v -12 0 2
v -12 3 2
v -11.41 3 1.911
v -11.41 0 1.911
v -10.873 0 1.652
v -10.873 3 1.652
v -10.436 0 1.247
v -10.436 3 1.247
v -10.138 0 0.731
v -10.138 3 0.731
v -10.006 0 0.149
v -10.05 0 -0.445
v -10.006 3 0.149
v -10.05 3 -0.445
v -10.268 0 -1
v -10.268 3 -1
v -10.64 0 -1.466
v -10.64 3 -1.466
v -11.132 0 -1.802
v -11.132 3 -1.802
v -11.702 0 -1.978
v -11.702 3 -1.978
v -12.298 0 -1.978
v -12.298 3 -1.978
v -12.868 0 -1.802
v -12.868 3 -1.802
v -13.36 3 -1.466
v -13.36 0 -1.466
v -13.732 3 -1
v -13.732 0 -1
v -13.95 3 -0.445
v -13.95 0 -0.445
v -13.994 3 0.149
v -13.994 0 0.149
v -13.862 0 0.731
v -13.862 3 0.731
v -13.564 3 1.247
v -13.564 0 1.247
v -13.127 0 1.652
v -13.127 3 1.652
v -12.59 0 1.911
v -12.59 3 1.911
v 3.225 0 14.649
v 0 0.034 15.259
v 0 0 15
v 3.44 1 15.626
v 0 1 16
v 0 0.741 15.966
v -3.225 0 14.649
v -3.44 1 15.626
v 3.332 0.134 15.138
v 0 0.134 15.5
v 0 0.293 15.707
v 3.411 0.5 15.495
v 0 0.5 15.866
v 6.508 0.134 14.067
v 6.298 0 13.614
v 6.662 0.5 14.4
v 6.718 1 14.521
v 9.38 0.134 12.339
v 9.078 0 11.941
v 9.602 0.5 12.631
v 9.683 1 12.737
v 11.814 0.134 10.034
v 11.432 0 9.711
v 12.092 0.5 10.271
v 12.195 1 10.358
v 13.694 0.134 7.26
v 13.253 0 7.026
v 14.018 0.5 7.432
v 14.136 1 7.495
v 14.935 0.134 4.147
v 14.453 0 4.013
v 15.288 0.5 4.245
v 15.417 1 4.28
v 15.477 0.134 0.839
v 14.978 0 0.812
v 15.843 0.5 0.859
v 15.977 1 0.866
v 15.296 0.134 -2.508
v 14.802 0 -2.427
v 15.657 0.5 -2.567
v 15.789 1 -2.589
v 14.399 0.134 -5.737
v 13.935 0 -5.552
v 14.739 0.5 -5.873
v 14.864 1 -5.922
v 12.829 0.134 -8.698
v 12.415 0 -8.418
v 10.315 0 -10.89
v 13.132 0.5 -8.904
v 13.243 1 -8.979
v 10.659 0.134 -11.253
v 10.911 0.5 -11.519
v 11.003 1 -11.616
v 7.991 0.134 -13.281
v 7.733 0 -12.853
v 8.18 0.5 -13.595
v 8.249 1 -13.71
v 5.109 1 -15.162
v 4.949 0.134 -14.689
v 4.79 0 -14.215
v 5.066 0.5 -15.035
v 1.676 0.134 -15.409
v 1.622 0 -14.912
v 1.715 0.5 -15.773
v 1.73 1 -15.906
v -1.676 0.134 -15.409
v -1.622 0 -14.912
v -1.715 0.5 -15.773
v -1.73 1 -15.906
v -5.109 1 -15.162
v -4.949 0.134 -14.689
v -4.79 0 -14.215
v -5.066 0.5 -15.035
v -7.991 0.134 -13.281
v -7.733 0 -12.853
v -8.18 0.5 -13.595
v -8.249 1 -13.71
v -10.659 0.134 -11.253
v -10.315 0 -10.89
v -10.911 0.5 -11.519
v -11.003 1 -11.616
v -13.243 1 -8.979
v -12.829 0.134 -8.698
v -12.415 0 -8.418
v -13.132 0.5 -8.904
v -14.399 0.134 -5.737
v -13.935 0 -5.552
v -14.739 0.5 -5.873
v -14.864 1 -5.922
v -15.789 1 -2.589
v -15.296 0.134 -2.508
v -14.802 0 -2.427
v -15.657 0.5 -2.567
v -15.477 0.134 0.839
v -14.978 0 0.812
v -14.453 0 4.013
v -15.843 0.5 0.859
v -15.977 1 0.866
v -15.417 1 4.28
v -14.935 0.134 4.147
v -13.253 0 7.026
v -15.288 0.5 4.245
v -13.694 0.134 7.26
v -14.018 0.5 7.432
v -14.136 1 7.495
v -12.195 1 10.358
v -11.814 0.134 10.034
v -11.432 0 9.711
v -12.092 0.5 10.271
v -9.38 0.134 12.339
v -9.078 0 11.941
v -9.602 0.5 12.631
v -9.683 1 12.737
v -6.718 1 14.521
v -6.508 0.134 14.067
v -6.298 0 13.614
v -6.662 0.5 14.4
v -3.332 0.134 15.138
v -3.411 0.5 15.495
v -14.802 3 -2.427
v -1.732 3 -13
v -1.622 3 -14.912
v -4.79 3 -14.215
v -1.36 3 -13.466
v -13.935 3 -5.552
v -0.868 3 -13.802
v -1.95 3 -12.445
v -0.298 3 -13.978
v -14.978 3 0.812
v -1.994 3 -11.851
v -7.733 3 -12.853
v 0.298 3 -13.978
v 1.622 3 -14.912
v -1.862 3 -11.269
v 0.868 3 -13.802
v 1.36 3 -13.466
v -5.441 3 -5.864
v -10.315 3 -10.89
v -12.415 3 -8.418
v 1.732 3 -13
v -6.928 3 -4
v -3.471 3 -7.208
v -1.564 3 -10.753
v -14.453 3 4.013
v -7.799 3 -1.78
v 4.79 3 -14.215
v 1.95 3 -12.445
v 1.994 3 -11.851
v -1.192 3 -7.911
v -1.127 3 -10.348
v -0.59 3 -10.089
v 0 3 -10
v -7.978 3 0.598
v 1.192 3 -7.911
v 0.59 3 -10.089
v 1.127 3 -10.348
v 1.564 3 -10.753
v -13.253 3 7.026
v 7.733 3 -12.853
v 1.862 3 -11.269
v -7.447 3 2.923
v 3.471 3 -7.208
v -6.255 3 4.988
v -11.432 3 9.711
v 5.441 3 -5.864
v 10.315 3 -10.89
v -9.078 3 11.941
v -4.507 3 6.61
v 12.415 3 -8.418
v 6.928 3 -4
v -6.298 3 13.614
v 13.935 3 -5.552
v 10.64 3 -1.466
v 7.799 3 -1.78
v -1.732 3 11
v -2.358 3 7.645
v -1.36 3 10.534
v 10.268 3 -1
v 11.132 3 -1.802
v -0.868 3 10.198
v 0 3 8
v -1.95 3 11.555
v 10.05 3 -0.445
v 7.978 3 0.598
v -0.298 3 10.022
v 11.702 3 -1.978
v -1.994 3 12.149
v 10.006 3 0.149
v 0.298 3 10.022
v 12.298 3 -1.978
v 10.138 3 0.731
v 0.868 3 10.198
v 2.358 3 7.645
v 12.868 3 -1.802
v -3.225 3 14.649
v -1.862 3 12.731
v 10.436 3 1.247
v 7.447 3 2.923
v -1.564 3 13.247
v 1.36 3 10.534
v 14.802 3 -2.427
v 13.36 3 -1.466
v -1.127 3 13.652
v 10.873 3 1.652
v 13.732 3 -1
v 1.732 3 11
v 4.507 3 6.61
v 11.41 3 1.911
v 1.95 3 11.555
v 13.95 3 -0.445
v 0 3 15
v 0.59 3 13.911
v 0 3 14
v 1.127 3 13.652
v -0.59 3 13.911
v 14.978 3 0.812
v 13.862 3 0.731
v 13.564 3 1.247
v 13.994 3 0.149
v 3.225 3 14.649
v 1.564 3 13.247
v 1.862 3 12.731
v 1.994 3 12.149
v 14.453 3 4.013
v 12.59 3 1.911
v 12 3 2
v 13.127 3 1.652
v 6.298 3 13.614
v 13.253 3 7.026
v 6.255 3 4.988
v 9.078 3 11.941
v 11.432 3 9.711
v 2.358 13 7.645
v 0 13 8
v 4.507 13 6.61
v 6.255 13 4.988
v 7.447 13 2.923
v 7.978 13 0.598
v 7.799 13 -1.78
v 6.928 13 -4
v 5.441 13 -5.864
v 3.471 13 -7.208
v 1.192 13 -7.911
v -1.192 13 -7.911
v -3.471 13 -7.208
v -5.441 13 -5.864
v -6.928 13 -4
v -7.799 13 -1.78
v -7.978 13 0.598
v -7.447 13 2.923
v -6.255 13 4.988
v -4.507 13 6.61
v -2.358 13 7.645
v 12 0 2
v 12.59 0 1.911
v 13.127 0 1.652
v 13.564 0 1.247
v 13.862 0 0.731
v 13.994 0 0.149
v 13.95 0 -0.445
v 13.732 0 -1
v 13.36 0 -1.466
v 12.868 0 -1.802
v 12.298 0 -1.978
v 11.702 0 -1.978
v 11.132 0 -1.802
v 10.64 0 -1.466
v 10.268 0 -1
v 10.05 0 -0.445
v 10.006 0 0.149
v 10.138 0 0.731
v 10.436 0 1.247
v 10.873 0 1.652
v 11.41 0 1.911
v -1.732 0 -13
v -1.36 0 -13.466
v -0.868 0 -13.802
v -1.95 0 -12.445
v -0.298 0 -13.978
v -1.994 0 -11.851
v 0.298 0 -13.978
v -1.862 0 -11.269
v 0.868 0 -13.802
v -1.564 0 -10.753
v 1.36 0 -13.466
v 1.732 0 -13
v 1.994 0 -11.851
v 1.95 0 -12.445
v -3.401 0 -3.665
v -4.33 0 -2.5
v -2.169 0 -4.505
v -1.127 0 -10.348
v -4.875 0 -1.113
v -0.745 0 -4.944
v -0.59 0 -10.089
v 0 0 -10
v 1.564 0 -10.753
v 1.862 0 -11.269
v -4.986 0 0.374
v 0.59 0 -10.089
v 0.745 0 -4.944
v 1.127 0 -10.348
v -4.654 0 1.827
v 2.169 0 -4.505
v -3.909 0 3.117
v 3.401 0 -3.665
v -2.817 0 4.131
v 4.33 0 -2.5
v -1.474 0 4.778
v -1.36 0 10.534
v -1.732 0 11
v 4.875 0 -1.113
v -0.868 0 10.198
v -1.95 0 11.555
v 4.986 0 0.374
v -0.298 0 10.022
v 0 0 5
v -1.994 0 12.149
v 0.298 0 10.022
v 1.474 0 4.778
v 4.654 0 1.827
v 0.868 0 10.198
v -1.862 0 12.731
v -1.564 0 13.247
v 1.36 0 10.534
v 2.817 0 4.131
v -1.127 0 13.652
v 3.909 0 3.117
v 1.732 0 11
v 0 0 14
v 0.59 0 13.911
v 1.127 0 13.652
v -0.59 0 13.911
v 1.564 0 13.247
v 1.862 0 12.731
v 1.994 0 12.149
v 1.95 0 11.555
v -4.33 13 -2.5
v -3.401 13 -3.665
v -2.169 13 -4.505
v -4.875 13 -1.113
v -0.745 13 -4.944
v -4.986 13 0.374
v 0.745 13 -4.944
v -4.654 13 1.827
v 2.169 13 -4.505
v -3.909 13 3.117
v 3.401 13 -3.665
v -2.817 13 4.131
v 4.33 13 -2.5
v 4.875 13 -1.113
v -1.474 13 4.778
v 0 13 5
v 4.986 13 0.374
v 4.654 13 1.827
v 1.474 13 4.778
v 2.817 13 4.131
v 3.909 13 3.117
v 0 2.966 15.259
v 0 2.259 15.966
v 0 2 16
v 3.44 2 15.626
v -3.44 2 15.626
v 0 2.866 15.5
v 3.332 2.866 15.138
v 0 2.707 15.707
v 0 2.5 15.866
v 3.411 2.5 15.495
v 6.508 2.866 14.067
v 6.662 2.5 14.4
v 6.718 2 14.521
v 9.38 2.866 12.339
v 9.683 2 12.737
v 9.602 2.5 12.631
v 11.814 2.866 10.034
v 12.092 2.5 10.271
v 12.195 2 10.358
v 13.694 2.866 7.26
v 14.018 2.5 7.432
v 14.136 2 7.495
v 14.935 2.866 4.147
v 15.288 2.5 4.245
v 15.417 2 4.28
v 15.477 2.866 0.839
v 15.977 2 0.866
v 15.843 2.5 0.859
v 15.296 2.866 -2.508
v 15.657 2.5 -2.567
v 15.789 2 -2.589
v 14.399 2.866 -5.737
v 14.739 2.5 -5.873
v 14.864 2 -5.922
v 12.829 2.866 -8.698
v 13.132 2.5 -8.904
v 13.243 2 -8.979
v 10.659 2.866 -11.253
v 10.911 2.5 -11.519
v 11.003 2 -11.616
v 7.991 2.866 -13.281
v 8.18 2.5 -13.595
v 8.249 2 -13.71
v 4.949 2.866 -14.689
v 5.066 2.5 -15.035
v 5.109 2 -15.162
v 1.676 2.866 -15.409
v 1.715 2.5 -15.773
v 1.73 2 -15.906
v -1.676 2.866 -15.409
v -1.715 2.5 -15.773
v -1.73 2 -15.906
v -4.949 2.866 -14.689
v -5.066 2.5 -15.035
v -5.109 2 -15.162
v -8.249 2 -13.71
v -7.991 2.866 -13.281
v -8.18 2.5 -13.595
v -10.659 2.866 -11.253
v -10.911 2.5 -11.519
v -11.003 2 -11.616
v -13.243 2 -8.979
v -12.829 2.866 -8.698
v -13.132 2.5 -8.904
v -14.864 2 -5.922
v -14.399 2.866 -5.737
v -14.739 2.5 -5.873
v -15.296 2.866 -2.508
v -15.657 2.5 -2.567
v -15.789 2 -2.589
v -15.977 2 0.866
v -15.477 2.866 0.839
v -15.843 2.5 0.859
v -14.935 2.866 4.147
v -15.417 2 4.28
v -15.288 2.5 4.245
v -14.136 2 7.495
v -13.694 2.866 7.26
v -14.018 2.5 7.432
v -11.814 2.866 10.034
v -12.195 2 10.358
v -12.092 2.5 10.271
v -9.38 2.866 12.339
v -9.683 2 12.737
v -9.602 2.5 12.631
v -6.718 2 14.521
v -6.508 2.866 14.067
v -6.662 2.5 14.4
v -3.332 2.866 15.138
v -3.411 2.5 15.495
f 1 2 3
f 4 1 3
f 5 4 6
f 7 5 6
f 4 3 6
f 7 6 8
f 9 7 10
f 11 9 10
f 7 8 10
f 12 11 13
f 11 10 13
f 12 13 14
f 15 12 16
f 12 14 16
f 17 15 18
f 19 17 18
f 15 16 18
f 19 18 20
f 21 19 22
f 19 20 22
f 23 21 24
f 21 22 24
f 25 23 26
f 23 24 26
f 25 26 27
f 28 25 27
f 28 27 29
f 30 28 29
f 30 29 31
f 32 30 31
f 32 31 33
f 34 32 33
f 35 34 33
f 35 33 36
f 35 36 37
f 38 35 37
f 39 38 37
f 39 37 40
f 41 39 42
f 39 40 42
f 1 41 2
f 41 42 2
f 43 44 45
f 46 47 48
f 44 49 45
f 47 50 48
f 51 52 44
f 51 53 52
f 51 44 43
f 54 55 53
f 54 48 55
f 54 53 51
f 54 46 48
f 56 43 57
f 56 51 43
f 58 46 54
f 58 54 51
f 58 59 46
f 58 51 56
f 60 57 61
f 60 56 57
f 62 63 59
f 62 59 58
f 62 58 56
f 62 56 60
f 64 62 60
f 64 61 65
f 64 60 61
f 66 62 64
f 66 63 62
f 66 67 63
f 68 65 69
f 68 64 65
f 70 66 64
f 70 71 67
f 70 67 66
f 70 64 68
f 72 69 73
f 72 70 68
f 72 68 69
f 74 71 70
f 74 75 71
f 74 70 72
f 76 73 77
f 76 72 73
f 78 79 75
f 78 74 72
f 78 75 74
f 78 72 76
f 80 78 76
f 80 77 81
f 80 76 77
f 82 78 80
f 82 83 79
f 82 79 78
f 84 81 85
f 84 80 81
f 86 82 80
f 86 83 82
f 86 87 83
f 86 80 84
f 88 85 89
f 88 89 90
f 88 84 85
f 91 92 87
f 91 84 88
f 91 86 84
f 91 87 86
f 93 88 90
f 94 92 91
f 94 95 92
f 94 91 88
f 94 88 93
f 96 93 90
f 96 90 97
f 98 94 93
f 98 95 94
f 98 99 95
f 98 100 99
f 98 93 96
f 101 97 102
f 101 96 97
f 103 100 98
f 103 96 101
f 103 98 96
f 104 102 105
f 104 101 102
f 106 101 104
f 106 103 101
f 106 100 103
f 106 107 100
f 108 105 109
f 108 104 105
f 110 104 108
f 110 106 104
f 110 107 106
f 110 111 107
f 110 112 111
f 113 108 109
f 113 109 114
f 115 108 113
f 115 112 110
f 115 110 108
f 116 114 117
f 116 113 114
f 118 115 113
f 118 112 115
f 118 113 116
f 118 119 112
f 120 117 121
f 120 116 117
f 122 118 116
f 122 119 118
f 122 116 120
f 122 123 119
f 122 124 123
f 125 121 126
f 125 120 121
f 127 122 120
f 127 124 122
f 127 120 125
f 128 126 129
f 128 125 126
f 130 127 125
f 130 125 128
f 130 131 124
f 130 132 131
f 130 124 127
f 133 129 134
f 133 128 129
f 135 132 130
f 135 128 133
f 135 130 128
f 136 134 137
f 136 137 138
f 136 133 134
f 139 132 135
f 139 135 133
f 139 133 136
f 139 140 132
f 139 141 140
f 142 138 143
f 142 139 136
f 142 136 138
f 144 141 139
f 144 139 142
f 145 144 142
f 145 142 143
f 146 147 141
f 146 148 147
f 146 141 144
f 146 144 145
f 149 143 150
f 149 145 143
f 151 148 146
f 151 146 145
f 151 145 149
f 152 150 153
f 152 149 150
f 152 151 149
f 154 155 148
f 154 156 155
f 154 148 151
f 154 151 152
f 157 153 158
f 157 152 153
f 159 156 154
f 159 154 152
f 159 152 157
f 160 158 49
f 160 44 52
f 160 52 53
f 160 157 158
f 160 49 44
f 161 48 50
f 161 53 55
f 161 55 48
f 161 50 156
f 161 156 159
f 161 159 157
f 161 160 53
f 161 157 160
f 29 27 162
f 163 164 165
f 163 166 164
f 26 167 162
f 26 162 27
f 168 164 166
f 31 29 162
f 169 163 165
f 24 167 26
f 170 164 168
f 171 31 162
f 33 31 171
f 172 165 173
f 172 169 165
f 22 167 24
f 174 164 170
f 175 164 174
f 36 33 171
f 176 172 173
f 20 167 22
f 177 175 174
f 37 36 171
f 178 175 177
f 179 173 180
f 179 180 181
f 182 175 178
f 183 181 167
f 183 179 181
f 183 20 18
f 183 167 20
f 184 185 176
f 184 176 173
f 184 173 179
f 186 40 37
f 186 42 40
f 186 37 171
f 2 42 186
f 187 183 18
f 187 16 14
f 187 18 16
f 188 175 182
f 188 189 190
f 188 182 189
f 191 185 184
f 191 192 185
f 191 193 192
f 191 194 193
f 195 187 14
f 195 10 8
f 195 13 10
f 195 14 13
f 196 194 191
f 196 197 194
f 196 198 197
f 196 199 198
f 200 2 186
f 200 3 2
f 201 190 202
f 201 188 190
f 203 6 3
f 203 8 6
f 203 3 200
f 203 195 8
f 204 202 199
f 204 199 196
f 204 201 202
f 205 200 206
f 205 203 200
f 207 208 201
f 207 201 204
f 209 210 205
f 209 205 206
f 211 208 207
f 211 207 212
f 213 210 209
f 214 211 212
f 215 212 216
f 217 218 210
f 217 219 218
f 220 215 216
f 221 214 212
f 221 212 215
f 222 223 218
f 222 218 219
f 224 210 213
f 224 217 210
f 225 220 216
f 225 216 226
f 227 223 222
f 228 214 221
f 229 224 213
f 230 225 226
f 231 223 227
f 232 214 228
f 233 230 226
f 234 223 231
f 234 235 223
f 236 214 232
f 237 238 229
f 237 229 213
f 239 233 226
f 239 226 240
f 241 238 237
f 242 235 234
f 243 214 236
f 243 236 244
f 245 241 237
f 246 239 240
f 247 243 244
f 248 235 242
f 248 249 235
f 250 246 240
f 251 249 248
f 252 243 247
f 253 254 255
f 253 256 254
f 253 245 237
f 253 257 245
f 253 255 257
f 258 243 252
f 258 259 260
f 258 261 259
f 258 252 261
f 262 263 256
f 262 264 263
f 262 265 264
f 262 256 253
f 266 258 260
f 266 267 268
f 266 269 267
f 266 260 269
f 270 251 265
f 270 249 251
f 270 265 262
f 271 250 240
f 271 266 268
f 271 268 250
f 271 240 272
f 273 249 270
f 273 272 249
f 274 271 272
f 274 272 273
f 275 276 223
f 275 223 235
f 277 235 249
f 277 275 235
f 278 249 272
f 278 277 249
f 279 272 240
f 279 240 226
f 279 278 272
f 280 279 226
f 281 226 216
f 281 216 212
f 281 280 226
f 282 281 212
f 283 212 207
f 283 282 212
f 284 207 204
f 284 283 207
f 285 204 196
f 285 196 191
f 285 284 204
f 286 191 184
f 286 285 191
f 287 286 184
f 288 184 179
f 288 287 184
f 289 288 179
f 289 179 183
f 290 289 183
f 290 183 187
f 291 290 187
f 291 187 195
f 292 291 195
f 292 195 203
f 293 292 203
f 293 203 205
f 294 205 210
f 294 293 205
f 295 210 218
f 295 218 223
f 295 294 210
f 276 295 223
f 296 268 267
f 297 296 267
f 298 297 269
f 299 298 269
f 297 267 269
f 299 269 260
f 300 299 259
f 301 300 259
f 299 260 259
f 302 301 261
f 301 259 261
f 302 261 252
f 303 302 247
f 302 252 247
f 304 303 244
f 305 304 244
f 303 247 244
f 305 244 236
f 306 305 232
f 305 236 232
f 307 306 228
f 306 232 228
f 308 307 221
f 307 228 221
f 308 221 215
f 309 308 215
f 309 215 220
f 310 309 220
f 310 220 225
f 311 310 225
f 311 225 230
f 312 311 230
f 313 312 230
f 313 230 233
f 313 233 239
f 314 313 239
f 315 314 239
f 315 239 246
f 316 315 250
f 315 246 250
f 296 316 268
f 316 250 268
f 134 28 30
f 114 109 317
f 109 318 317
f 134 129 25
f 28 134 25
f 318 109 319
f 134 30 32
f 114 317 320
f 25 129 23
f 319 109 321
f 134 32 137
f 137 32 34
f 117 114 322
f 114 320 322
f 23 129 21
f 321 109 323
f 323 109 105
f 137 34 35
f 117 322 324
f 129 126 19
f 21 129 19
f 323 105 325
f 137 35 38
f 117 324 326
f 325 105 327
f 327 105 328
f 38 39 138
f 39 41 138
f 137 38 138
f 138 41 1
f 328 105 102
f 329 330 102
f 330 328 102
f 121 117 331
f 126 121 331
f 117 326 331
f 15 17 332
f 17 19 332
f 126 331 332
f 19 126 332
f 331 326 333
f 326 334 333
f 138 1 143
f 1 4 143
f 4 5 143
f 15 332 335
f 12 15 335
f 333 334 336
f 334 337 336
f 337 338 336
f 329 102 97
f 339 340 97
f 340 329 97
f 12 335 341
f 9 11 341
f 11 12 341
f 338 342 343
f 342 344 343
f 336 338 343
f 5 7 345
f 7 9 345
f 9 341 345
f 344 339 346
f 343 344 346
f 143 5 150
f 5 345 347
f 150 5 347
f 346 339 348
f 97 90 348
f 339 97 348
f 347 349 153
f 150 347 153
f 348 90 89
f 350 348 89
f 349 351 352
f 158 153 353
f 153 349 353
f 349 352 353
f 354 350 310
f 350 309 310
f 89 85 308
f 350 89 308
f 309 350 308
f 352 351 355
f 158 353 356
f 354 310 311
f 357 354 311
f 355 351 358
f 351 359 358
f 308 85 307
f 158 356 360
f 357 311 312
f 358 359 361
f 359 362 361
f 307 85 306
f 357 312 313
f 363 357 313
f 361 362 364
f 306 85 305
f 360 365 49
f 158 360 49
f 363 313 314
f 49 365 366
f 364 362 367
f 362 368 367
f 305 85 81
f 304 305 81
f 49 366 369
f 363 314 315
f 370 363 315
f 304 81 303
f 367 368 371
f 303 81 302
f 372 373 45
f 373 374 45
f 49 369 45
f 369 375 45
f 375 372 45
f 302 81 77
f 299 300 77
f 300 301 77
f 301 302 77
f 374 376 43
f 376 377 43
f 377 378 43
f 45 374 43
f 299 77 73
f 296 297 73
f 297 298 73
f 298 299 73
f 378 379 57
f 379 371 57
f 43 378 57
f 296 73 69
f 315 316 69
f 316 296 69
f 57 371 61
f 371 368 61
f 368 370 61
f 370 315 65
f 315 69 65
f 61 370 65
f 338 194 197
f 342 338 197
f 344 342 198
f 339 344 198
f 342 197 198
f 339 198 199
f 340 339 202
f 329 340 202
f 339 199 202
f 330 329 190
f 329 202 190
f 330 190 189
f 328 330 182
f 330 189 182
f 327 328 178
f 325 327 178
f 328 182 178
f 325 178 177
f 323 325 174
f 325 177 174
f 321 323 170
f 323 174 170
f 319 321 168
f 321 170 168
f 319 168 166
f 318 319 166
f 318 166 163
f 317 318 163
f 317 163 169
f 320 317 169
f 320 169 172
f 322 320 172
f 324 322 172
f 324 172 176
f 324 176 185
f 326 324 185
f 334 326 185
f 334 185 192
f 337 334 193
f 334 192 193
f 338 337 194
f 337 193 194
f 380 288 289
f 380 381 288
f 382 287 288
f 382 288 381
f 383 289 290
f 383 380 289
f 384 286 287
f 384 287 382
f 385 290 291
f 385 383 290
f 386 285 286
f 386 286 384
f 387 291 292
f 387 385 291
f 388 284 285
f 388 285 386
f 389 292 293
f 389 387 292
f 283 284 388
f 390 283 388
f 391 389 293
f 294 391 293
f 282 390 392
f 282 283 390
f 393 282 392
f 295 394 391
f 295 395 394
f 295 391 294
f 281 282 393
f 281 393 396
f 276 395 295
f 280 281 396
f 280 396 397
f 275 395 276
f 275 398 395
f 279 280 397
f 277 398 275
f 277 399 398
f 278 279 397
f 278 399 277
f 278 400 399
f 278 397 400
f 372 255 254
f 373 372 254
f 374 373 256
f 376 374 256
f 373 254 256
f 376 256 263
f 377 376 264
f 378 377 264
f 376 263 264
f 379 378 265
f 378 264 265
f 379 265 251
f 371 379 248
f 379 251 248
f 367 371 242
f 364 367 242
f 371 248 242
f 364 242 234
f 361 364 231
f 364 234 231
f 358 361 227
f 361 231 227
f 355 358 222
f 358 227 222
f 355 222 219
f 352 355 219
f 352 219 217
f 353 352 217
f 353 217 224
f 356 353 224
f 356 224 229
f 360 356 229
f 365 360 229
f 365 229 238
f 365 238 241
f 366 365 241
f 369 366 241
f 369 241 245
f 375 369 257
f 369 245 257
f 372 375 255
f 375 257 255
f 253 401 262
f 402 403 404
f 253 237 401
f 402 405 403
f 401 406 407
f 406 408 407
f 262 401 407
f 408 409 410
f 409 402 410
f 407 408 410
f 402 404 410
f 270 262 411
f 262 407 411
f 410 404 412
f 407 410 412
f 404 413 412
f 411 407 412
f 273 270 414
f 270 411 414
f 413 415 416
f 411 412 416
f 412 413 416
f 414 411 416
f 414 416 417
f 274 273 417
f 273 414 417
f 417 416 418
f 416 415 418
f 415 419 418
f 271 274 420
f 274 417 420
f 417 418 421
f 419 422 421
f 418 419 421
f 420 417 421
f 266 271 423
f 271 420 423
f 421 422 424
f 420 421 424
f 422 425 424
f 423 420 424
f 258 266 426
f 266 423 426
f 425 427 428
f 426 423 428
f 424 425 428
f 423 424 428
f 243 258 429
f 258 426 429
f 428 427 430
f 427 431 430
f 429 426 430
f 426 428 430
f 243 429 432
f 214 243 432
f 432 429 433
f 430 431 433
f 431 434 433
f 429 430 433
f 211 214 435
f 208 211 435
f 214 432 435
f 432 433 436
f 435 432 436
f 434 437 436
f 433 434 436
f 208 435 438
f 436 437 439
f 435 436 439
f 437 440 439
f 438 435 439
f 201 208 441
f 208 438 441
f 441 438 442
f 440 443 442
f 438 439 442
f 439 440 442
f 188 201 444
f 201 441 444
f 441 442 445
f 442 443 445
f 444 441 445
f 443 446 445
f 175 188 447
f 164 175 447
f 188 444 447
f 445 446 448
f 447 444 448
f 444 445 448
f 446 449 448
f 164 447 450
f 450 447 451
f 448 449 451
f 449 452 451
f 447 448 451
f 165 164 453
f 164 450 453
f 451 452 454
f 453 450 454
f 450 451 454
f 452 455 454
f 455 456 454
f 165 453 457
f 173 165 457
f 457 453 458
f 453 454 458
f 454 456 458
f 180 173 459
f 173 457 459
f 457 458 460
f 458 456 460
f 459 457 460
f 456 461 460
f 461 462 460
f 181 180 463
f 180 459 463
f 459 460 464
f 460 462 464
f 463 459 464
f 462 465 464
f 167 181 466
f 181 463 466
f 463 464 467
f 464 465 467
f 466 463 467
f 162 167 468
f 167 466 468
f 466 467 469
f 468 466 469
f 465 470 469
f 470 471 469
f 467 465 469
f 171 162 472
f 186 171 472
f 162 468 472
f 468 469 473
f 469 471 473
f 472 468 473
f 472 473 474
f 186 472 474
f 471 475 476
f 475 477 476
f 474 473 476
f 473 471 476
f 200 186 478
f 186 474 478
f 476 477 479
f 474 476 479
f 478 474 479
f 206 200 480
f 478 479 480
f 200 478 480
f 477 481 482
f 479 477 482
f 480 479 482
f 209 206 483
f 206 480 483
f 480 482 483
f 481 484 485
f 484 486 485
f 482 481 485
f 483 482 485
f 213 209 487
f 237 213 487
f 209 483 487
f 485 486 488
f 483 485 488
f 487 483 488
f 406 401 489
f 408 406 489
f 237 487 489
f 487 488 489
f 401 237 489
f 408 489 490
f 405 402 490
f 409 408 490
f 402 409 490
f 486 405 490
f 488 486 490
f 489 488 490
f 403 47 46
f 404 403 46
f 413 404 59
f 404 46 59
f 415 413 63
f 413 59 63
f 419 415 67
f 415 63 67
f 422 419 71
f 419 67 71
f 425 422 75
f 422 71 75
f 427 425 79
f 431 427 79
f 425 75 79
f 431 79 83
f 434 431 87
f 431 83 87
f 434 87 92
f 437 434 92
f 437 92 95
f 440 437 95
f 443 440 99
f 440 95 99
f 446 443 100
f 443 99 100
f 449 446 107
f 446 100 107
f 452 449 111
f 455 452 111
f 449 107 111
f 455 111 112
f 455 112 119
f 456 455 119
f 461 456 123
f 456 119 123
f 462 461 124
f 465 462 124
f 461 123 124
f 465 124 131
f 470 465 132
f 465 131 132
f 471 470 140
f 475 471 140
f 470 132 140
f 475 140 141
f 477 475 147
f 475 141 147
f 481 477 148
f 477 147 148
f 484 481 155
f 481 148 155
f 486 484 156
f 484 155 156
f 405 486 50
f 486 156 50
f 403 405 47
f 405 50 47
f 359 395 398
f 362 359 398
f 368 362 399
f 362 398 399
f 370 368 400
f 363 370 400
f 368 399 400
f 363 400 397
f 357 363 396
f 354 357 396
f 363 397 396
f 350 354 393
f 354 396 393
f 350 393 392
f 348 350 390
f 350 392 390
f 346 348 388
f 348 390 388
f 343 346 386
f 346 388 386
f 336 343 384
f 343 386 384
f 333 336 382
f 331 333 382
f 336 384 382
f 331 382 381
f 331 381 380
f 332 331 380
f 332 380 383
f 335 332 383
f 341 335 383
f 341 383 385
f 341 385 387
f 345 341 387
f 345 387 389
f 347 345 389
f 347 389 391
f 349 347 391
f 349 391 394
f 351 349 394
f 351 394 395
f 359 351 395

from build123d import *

# Parameters (mm, degrees)
SKETCH_1_R          = 16
EXTRUDE_1_DEPTH     = 3
SKETCH_2_R          = 2
SKETCH_2_R_2        = 5
CUT_EXTRUDE_1_DEPTH = 3
EXTRUDE_START       = 10
SKETCH_4_R          = 8
SKETCH_4_R_2        = 5
EXTRUDE_2_DEPTH     = 10
FILLET_1_R          = 1


with BuildPart() as part:
    # ｽｹｯﾁ1 → ﾎﾞｽ - 押し出し1 (new body)
    with BuildSketch(Plane(origin=(0, 0, 0), x_dir=(1, 0, 0), z_dir=(0, 1, 0))):
        with Locations(Location((0, 0, 0), (0, 0, 270))):
            Circle(SKETCH_1_R)
    extrude(amount=EXTRUDE_1_DEPTH)

    # ｽｹｯﾁ2 → ｶｯﾄ - 押し出し1 (cut)
    with BuildSketch(Plane(origin=(0, 3, 0), x_dir=(1, 0, 0), z_dir=(0, 1, 0))):
        with Locations(Location((0, 12, 0), (0, 0, 270))):
            Circle(SKETCH_2_R)
        with Locations(Location((12, 0, 0), (0, 0, 270))):
            Circle(SKETCH_2_R)
        with Locations(Location((0, -12, 0), (0, 0, 270))):
            Circle(SKETCH_2_R)
        with Locations(Location((-12, 0, 0), (0, 0, 270))):
            Circle(SKETCH_2_R)
        with Locations(Location((0, 0, 0), (0, 0, 270))):
            Circle(SKETCH_2_R_2)
    extrude(amount=-CUT_EXTRUDE_1_DEPTH, mode=Mode.SUBTRACT)

    # ｽｹｯﾁ4 → ﾎﾞｽ - 押し出し2 (add)
    with BuildSketch(Plane(origin=(0, 3, 0), x_dir=(1, 0, 0), z_dir=(0, 1, 0)).offset(EXTRUDE_START)):
        with Locations(Location((0, 0, 0), (0, 0, 270))):
            Circle(SKETCH_4_R)
        with Locations(Location((0, 0, 0), (0, 0, 270))):
            Circle(SKETCH_4_R_2, mode=Mode.SUBTRACT)
    extrude(amount=-EXTRUDE_2_DEPTH)

    # ﾌｨﾚｯﾄ1
    fillet_1_edges = [part.edges().sort_by_distance(p)[0] for p in [
        (0, 0, -16),
        (0, 3, -16),
    ]]
    fillet(fillet_1_edges, radius=FILLET_1_R)


solid = part.part
